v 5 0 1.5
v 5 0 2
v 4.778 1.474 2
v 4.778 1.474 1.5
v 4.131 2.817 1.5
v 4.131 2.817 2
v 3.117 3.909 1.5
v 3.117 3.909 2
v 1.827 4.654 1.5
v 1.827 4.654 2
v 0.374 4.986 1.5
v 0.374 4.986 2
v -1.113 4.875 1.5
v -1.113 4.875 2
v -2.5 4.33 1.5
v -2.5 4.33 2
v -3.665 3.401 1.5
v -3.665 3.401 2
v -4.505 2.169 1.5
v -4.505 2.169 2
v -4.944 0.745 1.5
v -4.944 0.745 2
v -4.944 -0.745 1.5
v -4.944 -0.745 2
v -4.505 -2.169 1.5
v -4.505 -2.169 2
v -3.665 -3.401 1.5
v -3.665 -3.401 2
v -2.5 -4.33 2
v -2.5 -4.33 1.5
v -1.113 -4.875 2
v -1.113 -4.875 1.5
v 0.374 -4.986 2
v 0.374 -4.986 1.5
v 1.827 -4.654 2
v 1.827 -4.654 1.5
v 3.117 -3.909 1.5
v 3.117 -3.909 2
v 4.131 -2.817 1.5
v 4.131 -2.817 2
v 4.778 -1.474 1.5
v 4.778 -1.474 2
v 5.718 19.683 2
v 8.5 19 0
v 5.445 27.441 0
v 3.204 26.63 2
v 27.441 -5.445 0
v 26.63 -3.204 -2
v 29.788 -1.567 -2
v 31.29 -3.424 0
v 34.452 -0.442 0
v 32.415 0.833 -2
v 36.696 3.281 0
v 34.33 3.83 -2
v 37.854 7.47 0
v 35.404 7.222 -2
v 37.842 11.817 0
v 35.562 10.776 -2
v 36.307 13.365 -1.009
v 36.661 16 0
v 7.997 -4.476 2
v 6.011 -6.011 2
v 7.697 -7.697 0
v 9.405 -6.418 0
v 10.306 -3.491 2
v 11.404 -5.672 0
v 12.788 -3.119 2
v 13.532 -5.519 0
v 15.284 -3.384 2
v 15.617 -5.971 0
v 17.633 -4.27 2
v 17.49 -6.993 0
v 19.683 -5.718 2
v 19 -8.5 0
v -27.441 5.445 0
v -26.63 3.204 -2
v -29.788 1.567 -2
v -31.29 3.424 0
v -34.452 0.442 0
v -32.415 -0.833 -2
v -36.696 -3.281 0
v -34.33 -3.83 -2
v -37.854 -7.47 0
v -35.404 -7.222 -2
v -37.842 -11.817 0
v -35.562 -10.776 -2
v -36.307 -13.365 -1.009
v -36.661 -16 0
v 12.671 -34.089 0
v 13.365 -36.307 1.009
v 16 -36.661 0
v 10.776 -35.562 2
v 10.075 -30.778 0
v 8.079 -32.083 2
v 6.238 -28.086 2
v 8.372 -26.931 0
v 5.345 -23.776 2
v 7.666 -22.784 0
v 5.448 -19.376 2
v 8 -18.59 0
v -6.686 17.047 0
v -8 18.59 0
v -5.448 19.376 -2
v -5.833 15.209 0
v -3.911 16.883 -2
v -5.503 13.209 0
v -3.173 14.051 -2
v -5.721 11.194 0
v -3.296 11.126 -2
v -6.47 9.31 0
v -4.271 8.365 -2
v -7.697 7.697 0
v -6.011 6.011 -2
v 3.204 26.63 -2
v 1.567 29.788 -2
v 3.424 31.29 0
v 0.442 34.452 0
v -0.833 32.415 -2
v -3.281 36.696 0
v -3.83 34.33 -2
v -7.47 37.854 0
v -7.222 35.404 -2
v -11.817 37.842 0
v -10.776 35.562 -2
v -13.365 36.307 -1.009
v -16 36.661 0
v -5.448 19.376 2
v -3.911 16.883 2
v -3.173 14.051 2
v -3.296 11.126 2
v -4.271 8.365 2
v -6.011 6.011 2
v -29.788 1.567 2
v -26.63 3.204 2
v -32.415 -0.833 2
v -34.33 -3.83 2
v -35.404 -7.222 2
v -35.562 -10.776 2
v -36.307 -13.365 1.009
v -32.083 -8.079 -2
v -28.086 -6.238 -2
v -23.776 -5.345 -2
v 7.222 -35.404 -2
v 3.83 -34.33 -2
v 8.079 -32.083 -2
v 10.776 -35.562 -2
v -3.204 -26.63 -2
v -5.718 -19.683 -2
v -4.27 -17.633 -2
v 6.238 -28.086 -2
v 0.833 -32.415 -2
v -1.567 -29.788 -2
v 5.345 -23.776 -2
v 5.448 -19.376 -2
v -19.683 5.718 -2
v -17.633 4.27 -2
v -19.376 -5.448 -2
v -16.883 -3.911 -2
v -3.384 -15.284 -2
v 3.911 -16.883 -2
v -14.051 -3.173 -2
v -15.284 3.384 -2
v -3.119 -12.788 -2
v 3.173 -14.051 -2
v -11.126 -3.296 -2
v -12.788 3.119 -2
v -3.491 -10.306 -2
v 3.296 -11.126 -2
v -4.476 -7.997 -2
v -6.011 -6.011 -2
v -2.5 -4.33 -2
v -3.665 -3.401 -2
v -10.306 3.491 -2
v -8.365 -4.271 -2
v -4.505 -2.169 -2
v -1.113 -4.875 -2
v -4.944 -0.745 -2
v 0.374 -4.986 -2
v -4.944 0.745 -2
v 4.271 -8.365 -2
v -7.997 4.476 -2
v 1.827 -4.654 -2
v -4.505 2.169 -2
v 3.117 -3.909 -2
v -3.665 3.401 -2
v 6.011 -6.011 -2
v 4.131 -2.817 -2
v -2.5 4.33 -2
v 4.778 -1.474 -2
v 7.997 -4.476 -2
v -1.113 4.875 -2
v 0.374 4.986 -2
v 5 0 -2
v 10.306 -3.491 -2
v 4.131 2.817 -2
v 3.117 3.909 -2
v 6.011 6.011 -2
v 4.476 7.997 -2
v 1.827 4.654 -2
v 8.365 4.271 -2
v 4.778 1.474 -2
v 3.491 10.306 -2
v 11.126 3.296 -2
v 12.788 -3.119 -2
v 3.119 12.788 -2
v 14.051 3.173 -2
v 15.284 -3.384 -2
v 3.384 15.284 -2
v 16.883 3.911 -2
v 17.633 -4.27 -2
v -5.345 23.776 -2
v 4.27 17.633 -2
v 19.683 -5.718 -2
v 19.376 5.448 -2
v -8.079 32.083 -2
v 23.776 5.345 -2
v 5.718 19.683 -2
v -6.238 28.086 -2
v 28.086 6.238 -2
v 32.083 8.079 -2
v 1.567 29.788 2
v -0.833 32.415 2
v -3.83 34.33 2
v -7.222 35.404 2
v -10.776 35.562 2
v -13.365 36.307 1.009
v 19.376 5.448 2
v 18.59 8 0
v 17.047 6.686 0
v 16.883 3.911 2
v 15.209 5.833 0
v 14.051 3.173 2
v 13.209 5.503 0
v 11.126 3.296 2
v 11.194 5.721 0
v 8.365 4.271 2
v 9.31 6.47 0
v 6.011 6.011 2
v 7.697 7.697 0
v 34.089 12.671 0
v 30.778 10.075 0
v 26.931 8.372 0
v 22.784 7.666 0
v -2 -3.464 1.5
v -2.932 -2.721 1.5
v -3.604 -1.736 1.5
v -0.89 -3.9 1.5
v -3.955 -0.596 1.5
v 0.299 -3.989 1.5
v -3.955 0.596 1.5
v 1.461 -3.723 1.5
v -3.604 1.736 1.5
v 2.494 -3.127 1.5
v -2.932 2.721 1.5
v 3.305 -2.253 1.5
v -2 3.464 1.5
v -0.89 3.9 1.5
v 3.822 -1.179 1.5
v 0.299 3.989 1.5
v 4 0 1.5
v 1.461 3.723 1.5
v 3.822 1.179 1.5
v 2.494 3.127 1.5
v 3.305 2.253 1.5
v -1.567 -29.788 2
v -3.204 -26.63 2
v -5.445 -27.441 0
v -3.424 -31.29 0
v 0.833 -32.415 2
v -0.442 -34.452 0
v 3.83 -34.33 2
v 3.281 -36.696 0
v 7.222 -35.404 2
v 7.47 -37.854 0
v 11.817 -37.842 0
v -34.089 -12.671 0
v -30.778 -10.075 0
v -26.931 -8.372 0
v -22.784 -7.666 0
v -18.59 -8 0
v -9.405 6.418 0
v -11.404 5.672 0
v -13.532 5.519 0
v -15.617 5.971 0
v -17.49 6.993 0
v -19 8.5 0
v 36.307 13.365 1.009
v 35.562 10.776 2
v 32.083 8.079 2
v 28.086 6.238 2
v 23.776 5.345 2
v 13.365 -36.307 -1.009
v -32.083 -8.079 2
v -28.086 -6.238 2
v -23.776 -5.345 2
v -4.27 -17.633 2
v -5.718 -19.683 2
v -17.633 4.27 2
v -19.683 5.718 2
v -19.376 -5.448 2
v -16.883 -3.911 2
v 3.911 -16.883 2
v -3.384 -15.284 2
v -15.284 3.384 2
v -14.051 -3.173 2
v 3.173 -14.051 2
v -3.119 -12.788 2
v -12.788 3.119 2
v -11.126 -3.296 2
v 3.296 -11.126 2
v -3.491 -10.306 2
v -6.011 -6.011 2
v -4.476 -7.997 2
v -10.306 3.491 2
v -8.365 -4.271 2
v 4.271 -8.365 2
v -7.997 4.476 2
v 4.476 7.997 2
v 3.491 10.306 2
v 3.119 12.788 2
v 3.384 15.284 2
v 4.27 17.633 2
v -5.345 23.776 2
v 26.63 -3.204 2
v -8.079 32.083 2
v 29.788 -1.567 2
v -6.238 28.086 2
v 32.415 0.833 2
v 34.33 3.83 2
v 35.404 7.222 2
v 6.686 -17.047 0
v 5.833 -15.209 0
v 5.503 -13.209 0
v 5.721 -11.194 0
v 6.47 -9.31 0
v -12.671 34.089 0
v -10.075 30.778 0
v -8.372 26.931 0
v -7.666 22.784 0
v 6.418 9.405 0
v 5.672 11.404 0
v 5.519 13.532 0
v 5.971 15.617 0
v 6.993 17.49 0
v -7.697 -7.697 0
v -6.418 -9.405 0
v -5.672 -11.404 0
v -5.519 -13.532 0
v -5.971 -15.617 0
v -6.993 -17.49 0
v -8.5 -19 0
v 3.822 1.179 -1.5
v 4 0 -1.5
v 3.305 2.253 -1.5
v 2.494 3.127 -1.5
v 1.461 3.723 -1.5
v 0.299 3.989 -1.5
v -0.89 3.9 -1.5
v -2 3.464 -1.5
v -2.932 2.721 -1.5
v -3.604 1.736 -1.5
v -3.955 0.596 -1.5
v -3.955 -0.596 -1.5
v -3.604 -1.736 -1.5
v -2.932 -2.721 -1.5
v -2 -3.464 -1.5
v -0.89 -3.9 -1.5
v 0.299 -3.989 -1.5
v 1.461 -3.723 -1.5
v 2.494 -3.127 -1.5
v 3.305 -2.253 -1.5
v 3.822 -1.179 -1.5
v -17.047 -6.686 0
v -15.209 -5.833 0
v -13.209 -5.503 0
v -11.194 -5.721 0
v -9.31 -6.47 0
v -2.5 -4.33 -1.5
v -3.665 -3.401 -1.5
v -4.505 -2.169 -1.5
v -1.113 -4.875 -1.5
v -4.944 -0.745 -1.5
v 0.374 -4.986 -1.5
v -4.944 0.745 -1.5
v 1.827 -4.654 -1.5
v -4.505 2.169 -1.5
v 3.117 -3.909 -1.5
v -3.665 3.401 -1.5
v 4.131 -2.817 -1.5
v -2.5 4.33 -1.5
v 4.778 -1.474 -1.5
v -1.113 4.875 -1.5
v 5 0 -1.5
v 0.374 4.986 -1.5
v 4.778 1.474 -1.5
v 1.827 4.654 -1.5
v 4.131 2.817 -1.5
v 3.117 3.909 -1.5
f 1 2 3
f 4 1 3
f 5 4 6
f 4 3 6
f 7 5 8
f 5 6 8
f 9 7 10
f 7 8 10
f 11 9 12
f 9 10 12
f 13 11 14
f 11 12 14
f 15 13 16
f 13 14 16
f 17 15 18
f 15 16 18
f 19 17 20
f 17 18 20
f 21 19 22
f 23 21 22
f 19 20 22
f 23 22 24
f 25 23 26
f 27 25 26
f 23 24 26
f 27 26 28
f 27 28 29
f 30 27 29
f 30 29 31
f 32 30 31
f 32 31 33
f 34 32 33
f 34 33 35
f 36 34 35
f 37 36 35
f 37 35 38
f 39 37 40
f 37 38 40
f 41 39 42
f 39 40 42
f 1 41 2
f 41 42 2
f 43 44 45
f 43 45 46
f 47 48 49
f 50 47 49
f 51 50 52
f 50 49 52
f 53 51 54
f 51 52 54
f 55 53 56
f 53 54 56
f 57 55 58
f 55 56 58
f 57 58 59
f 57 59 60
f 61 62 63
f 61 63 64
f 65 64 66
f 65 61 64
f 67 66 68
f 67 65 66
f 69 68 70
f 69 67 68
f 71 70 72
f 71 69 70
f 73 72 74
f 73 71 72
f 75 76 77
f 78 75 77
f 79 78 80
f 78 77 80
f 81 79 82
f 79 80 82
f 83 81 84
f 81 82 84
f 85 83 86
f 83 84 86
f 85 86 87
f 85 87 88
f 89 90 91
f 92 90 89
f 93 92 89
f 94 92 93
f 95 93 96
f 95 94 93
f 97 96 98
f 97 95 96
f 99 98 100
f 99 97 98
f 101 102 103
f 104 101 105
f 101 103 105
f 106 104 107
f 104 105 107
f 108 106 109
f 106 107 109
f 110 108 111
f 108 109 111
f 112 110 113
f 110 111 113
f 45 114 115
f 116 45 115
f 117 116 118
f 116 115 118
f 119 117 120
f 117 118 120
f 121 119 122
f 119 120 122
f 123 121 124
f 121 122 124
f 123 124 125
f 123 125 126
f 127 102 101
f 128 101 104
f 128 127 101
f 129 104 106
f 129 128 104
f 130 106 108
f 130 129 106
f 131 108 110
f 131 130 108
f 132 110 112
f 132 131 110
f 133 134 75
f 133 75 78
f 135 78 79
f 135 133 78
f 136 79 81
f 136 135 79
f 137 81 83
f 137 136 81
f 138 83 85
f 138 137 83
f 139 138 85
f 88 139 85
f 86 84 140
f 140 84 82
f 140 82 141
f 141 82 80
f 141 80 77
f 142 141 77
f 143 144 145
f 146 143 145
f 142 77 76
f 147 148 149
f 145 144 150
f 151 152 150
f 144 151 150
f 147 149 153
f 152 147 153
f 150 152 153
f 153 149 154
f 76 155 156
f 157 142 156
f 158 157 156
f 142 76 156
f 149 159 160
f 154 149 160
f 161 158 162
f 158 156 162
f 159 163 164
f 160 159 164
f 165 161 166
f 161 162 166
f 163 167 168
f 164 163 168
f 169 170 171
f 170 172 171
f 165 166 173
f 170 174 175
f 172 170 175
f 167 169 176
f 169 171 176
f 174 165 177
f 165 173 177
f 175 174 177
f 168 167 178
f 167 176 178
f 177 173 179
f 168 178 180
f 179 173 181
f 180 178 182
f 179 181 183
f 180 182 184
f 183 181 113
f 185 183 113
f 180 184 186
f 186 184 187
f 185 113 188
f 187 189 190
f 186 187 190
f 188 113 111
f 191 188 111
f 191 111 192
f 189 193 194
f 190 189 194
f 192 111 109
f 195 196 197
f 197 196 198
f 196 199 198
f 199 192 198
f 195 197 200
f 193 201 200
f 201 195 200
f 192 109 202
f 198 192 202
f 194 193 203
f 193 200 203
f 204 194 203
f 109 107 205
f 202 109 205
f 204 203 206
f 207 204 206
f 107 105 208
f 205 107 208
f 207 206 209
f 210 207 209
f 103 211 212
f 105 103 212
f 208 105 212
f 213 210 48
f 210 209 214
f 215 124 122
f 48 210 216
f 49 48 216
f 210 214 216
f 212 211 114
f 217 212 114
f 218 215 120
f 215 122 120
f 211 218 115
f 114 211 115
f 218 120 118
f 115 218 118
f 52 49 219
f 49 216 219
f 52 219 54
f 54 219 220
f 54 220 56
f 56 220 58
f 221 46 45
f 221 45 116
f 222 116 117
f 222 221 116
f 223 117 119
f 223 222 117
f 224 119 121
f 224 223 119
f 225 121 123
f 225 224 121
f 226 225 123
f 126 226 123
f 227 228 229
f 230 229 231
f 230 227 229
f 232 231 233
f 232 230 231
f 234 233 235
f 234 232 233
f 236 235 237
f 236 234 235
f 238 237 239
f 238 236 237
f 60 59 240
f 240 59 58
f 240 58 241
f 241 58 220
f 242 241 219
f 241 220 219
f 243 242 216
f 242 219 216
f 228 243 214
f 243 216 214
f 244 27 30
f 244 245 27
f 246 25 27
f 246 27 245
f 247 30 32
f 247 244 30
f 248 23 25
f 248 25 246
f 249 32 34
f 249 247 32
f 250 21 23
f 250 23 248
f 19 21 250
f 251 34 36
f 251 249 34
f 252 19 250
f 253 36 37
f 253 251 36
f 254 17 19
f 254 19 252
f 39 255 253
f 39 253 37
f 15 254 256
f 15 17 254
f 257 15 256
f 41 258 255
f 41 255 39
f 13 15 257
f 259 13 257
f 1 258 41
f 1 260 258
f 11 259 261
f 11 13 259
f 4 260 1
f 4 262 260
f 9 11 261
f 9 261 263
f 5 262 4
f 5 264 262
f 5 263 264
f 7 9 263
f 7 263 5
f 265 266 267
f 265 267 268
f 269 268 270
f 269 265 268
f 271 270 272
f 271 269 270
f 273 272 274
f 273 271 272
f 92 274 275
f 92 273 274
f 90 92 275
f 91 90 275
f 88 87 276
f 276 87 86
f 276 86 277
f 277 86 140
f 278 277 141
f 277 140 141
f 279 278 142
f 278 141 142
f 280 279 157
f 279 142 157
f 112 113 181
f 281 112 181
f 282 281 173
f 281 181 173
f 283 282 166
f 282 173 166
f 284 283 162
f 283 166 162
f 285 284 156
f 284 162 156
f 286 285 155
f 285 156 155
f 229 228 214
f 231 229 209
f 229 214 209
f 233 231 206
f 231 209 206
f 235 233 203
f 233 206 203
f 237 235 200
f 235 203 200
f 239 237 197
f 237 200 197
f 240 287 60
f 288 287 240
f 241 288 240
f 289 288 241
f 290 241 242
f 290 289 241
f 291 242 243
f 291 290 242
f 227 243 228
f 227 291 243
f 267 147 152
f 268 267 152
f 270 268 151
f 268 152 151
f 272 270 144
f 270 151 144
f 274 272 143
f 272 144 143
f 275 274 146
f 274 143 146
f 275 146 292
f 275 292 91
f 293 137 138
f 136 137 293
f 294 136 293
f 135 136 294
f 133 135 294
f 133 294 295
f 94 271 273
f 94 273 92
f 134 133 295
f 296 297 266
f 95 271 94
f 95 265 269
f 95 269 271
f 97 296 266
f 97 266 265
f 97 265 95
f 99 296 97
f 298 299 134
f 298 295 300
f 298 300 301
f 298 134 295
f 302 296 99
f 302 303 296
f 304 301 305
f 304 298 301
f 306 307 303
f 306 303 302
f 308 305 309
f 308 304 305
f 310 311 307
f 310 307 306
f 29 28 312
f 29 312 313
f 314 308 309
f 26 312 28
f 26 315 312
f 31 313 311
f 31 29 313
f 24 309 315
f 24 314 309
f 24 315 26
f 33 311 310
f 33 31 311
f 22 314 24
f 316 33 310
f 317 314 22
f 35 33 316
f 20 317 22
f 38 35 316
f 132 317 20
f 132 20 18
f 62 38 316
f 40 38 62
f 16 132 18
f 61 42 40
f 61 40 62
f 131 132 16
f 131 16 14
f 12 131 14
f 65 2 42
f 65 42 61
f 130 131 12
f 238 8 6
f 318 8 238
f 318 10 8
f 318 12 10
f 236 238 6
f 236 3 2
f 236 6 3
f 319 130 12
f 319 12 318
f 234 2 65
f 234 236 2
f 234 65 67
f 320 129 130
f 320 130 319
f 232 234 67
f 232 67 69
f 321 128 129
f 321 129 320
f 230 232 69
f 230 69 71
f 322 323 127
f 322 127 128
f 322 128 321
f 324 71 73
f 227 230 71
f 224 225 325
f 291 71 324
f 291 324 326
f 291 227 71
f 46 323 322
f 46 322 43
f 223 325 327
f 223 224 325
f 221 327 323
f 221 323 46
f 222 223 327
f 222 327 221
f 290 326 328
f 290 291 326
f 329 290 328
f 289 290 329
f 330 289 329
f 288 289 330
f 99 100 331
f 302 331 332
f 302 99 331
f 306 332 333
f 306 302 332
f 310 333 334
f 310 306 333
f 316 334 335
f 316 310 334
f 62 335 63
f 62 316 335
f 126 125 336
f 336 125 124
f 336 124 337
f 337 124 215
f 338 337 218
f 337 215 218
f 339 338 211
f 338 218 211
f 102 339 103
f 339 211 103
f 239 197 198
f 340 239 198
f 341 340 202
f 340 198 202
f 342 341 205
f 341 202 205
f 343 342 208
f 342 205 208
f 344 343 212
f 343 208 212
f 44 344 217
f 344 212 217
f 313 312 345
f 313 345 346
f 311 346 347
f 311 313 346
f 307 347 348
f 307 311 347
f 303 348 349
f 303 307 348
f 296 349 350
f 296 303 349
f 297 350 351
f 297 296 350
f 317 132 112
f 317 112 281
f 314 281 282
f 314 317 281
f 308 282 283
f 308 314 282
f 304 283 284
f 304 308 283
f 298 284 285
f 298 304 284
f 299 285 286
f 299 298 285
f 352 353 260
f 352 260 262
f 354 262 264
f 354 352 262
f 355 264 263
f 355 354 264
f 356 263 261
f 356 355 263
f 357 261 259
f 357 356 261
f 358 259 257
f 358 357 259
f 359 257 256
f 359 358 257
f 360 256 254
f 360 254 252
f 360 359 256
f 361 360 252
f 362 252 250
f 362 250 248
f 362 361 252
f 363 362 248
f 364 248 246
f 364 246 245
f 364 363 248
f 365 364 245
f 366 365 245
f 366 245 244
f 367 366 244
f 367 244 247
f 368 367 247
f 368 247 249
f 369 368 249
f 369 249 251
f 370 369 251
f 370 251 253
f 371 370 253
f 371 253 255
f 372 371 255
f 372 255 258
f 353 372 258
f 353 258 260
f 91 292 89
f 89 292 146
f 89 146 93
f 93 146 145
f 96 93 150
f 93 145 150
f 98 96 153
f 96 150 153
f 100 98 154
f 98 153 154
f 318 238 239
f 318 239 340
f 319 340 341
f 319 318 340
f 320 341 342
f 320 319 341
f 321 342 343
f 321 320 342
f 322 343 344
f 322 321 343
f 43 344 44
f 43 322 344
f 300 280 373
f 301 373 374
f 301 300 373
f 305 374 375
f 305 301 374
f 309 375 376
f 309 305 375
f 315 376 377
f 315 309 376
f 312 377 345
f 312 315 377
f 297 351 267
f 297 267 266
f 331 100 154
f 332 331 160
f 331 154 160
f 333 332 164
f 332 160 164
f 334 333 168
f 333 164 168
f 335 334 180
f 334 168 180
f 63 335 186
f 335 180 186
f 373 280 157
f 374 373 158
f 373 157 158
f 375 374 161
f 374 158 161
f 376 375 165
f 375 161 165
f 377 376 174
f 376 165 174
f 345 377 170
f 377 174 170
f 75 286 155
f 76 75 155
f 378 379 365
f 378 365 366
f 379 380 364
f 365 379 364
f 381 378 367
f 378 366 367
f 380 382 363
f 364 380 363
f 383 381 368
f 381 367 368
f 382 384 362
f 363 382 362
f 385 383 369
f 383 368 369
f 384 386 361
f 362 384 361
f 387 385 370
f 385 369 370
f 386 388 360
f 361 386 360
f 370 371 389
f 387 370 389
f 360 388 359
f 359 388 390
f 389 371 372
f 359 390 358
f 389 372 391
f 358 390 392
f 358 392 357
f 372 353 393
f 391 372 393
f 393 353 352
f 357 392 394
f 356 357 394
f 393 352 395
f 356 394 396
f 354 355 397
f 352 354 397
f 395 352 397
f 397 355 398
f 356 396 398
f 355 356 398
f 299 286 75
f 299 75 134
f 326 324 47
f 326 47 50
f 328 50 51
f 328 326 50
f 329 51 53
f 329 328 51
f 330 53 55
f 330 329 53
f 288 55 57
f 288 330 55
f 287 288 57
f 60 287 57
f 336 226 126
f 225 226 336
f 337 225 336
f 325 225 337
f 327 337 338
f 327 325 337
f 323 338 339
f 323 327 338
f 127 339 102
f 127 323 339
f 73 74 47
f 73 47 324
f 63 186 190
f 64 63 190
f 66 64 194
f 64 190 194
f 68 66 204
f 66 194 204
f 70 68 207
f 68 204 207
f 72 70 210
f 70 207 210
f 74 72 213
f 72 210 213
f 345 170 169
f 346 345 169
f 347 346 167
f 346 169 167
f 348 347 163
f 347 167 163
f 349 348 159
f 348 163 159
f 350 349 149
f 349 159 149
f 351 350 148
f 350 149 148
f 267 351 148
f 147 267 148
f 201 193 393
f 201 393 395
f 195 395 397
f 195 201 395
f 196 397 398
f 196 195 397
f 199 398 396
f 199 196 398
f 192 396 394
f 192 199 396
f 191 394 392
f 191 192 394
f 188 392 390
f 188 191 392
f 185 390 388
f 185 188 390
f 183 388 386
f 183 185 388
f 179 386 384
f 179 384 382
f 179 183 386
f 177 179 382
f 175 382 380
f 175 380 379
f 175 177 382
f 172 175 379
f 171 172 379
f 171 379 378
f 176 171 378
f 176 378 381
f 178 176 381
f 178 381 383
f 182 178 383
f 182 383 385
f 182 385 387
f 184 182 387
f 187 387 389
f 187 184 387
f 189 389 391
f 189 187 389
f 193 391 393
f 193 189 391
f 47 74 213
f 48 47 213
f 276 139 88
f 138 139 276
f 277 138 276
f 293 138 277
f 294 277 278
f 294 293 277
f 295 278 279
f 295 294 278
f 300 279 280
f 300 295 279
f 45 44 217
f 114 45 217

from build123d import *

# Parameters (mm, degrees)
BOSS_EXTRUDE1_DEPTH = 2
BOSS_EXTRUDE1_TAPER = 50
SKETCH2_R           = 5
CUT_EXTRUDE1_DEPTH  = 0.5
SKETCH4_R           = 4
CUT_EXTRUDE2_DEPTH  = 54.772179322


with BuildPart() as part:
    # Sketch1 → Boss-Extrude1 (new body)
    with BuildSketch(Plane.XY):
        with BuildLine():
            Line((8.5, 19), (5.445025952, 27.441287035))
            ThreePointArc((5.445025952, 27.441287035), (-3.280737627, 36.695578385), (-16, 36.66060556))
            ThreePointArc((-16, 36.66060556), (-9.104527974, 28.907248173), (-8, 18.590169944))
            ThreePointArc((-8, 18.590169944), (-5.502905317, 13.208737444), (-7.696699141, 7.696699141))
            ThreePointArc((-7.696699141, 7.696699141), (-13.531667651, 5.518868434), (-19, 8.5))
            Line((-19, 8.5), (-27.441287035, 5.445025952))
            ThreePointArc((-27.441287035, 5.445025952), (-36.695578385, -3.280737627), (-36.66060556, -16))
            ThreePointArc((-36.66060556, -16), (-28.907248173, -9.104527974), (-18.590169944, -8))
            ThreePointArc((-18.590169944, -8), (-13.208737444, -5.502905317), (-7.696699141, -7.696699141))
            ThreePointArc((-7.696699141, -7.696699141), (-5.518868434, -13.531667651), (-8.5, -19))
            Line((-8.5, -19), (-5.445025952, -27.441287035))
            ThreePointArc((-5.445025952, -27.441287035), (3.280737627, -36.695578385), (16, -36.66060556))
            ThreePointArc((16, -36.66060556), (9.104527974, -28.907248173), (8, -18.590169944))
            ThreePointArc((8, -18.590169944), (5.502905317, -13.208737444), (7.696699141, -7.696699141))
            ThreePointArc((7.696699141, -7.696699141), (13.531667651, -5.518868434), (19, -8.5))
            Line((19, -8.5), (27.441287035, -5.445025952))
            ThreePointArc((27.441287035, -5.445025952), (36.695578385, 3.280737627), (36.66060556, 16))
            ThreePointArc((36.66060556, 16), (28.907248173, 9.104527974), (18.590169944, 8))
            ThreePointArc((18.590169944, 8), (13.208737444, 5.502905317), (7.696699141, 7.696699141))
            ThreePointArc((7.696699141, 7.696699141), (5.518868434, 13.531667651), (8.5, 19))
        make_face()
    boss_extrude1 = extrude(amount=BOSS_EXTRUDE1_DEPTH, taper=BOSS_EXTRUDE1_TAPER)

    # Sketch2 → Cut-Extrude1 (cut)
    with BuildSketch(Plane.XY.offset(2)):
        Circle(SKETCH2_R)
    cut_extrude1 = extrude(amount=-CUT_EXTRUDE1_DEPTH, mode=Mode.SUBTRACT)

    # Sketch4 → Cut-Extrude2 (cut, through all)
    with BuildSketch(Plane.XY.offset(2)):
        Circle(SKETCH4_R)
    cut_extrude2 = extrude(amount=-CUT_EXTRUDE2_DEPTH, mode=Mode.SUBTRACT)


with BuildPart() as mirror4_1:
    # Mirror4: Boss-Extrude1 across Front Plane
    add(boss_extrude1.mirror(Plane.XY))

    # Mirror4 2: Cut-Extrude1, Cut-Extrude2 across Front Plane
    add(cut_extrude1.mirror(Plane.XY), mode=Mode.SUBTRACT)
    add(cut_extrude2.mirror(Plane.XY), mode=Mode.SUBTRACT)


with BuildPart() as part_1:
    add(part.part)

    # Mirror4 united with what the copies touc: union Mirror4_1
    add(mirror4_1.part)


solid = part_1.part
